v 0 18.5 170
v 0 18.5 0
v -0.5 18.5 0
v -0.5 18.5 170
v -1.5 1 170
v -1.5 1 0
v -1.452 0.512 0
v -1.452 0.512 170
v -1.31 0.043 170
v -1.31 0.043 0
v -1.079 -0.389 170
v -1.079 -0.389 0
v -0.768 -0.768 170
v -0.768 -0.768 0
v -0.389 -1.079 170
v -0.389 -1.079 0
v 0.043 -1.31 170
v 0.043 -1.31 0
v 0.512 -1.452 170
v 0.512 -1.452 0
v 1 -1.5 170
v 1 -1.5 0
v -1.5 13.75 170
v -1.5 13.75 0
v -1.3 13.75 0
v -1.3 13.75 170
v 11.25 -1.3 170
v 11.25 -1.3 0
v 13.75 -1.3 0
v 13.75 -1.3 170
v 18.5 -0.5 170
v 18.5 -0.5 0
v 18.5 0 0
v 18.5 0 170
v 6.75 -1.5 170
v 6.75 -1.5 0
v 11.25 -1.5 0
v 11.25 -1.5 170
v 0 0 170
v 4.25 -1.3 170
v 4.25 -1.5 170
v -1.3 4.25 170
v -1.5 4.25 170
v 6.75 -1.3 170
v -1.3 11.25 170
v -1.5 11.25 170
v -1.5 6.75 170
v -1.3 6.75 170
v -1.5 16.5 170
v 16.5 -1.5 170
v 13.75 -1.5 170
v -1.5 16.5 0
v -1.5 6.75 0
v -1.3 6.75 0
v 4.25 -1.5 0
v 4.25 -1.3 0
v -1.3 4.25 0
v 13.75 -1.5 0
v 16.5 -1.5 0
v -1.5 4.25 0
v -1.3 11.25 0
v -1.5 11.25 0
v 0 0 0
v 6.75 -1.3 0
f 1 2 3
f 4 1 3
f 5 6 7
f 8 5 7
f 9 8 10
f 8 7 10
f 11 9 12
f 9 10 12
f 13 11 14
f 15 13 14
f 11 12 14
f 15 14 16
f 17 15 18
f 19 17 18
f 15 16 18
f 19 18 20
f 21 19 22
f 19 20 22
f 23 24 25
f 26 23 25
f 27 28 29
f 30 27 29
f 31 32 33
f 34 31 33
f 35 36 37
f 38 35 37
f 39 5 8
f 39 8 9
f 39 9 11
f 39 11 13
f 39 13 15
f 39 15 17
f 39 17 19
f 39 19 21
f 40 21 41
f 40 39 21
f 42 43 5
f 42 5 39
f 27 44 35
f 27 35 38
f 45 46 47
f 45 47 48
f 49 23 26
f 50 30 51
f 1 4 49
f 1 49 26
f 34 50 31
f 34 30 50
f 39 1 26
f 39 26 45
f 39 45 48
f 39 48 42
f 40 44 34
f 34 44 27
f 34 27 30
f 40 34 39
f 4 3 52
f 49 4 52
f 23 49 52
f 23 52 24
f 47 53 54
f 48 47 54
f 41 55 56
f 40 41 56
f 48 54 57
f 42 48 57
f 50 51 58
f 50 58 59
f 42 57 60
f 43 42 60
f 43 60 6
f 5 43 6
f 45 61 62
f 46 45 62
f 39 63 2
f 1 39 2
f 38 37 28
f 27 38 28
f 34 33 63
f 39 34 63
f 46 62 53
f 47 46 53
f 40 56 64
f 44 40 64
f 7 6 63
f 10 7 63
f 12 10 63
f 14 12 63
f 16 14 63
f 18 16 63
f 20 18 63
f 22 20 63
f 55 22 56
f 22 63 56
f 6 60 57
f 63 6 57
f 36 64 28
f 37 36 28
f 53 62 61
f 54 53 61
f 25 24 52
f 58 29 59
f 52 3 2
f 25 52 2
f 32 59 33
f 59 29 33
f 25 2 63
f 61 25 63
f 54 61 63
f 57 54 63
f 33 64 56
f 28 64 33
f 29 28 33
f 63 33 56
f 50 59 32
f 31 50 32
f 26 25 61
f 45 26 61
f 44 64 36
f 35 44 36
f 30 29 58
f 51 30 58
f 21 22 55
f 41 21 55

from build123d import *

# Parameters (mm, degrees)
LENGTH_DEPTH = 170


with BuildPart() as part:
    # Sketch1 → Length (new body)
    with BuildSketch(Plane.XY):
        with BuildLine():
            Line((0, 0), (0, 18.5))
            Line((0, 18.5), (-0.5, 18.5))
            Line((-0.5, 18.5), (-1.5, 16.5))
            Line((-1.5, 16.5), (-1.5, 13.75))
            Line((-1.5, 13.75), (-1.3, 13.75))
            Line((-1.3, 13.75), (-1.3, 11.25))
            Line((-1.3, 11.25), (-1.5, 11.25))
            Line((-1.5, 11.25), (-1.5, 6.75))
            Line((-1.5, 6.75), (-1.3, 6.75))
            Line((-1.3, 6.75), (-1.3, 4.25))
            Line((-1.3, 4.25), (-1.5, 4.25))
            Line((-1.5, 4.25), (-1.5, 1))
            ThreePointArc((-1.5, 1), (-0.767766953, -0.767766953), (1, -1.5))
            Line((1, -1.5), (4.25, -1.5))
            Line((4.25, -1.5), (4.25, -1.3))
            Line((4.25, -1.3), (6.75, -1.3))
            Line((6.75, -1.3), (6.75, -1.5))
            Line((6.75, -1.5), (11.25, -1.5))
            Line((11.25, -1.5), (11.25, -1.3))
            Line((11.25, -1.3), (13.75, -1.3))
            Line((13.75, -1.3), (13.75, -1.5))
            Line((13.75, -1.5), (16.5, -1.5))
            Line((16.5, -1.5), (18.5, -0.5))
            Line((18.5, -0.5), (18.5, 0))
            Line((18.5, 0), (0, 0))
        make_face()
    extrude(amount=LENGTH_DEPTH)


solid = part.part
